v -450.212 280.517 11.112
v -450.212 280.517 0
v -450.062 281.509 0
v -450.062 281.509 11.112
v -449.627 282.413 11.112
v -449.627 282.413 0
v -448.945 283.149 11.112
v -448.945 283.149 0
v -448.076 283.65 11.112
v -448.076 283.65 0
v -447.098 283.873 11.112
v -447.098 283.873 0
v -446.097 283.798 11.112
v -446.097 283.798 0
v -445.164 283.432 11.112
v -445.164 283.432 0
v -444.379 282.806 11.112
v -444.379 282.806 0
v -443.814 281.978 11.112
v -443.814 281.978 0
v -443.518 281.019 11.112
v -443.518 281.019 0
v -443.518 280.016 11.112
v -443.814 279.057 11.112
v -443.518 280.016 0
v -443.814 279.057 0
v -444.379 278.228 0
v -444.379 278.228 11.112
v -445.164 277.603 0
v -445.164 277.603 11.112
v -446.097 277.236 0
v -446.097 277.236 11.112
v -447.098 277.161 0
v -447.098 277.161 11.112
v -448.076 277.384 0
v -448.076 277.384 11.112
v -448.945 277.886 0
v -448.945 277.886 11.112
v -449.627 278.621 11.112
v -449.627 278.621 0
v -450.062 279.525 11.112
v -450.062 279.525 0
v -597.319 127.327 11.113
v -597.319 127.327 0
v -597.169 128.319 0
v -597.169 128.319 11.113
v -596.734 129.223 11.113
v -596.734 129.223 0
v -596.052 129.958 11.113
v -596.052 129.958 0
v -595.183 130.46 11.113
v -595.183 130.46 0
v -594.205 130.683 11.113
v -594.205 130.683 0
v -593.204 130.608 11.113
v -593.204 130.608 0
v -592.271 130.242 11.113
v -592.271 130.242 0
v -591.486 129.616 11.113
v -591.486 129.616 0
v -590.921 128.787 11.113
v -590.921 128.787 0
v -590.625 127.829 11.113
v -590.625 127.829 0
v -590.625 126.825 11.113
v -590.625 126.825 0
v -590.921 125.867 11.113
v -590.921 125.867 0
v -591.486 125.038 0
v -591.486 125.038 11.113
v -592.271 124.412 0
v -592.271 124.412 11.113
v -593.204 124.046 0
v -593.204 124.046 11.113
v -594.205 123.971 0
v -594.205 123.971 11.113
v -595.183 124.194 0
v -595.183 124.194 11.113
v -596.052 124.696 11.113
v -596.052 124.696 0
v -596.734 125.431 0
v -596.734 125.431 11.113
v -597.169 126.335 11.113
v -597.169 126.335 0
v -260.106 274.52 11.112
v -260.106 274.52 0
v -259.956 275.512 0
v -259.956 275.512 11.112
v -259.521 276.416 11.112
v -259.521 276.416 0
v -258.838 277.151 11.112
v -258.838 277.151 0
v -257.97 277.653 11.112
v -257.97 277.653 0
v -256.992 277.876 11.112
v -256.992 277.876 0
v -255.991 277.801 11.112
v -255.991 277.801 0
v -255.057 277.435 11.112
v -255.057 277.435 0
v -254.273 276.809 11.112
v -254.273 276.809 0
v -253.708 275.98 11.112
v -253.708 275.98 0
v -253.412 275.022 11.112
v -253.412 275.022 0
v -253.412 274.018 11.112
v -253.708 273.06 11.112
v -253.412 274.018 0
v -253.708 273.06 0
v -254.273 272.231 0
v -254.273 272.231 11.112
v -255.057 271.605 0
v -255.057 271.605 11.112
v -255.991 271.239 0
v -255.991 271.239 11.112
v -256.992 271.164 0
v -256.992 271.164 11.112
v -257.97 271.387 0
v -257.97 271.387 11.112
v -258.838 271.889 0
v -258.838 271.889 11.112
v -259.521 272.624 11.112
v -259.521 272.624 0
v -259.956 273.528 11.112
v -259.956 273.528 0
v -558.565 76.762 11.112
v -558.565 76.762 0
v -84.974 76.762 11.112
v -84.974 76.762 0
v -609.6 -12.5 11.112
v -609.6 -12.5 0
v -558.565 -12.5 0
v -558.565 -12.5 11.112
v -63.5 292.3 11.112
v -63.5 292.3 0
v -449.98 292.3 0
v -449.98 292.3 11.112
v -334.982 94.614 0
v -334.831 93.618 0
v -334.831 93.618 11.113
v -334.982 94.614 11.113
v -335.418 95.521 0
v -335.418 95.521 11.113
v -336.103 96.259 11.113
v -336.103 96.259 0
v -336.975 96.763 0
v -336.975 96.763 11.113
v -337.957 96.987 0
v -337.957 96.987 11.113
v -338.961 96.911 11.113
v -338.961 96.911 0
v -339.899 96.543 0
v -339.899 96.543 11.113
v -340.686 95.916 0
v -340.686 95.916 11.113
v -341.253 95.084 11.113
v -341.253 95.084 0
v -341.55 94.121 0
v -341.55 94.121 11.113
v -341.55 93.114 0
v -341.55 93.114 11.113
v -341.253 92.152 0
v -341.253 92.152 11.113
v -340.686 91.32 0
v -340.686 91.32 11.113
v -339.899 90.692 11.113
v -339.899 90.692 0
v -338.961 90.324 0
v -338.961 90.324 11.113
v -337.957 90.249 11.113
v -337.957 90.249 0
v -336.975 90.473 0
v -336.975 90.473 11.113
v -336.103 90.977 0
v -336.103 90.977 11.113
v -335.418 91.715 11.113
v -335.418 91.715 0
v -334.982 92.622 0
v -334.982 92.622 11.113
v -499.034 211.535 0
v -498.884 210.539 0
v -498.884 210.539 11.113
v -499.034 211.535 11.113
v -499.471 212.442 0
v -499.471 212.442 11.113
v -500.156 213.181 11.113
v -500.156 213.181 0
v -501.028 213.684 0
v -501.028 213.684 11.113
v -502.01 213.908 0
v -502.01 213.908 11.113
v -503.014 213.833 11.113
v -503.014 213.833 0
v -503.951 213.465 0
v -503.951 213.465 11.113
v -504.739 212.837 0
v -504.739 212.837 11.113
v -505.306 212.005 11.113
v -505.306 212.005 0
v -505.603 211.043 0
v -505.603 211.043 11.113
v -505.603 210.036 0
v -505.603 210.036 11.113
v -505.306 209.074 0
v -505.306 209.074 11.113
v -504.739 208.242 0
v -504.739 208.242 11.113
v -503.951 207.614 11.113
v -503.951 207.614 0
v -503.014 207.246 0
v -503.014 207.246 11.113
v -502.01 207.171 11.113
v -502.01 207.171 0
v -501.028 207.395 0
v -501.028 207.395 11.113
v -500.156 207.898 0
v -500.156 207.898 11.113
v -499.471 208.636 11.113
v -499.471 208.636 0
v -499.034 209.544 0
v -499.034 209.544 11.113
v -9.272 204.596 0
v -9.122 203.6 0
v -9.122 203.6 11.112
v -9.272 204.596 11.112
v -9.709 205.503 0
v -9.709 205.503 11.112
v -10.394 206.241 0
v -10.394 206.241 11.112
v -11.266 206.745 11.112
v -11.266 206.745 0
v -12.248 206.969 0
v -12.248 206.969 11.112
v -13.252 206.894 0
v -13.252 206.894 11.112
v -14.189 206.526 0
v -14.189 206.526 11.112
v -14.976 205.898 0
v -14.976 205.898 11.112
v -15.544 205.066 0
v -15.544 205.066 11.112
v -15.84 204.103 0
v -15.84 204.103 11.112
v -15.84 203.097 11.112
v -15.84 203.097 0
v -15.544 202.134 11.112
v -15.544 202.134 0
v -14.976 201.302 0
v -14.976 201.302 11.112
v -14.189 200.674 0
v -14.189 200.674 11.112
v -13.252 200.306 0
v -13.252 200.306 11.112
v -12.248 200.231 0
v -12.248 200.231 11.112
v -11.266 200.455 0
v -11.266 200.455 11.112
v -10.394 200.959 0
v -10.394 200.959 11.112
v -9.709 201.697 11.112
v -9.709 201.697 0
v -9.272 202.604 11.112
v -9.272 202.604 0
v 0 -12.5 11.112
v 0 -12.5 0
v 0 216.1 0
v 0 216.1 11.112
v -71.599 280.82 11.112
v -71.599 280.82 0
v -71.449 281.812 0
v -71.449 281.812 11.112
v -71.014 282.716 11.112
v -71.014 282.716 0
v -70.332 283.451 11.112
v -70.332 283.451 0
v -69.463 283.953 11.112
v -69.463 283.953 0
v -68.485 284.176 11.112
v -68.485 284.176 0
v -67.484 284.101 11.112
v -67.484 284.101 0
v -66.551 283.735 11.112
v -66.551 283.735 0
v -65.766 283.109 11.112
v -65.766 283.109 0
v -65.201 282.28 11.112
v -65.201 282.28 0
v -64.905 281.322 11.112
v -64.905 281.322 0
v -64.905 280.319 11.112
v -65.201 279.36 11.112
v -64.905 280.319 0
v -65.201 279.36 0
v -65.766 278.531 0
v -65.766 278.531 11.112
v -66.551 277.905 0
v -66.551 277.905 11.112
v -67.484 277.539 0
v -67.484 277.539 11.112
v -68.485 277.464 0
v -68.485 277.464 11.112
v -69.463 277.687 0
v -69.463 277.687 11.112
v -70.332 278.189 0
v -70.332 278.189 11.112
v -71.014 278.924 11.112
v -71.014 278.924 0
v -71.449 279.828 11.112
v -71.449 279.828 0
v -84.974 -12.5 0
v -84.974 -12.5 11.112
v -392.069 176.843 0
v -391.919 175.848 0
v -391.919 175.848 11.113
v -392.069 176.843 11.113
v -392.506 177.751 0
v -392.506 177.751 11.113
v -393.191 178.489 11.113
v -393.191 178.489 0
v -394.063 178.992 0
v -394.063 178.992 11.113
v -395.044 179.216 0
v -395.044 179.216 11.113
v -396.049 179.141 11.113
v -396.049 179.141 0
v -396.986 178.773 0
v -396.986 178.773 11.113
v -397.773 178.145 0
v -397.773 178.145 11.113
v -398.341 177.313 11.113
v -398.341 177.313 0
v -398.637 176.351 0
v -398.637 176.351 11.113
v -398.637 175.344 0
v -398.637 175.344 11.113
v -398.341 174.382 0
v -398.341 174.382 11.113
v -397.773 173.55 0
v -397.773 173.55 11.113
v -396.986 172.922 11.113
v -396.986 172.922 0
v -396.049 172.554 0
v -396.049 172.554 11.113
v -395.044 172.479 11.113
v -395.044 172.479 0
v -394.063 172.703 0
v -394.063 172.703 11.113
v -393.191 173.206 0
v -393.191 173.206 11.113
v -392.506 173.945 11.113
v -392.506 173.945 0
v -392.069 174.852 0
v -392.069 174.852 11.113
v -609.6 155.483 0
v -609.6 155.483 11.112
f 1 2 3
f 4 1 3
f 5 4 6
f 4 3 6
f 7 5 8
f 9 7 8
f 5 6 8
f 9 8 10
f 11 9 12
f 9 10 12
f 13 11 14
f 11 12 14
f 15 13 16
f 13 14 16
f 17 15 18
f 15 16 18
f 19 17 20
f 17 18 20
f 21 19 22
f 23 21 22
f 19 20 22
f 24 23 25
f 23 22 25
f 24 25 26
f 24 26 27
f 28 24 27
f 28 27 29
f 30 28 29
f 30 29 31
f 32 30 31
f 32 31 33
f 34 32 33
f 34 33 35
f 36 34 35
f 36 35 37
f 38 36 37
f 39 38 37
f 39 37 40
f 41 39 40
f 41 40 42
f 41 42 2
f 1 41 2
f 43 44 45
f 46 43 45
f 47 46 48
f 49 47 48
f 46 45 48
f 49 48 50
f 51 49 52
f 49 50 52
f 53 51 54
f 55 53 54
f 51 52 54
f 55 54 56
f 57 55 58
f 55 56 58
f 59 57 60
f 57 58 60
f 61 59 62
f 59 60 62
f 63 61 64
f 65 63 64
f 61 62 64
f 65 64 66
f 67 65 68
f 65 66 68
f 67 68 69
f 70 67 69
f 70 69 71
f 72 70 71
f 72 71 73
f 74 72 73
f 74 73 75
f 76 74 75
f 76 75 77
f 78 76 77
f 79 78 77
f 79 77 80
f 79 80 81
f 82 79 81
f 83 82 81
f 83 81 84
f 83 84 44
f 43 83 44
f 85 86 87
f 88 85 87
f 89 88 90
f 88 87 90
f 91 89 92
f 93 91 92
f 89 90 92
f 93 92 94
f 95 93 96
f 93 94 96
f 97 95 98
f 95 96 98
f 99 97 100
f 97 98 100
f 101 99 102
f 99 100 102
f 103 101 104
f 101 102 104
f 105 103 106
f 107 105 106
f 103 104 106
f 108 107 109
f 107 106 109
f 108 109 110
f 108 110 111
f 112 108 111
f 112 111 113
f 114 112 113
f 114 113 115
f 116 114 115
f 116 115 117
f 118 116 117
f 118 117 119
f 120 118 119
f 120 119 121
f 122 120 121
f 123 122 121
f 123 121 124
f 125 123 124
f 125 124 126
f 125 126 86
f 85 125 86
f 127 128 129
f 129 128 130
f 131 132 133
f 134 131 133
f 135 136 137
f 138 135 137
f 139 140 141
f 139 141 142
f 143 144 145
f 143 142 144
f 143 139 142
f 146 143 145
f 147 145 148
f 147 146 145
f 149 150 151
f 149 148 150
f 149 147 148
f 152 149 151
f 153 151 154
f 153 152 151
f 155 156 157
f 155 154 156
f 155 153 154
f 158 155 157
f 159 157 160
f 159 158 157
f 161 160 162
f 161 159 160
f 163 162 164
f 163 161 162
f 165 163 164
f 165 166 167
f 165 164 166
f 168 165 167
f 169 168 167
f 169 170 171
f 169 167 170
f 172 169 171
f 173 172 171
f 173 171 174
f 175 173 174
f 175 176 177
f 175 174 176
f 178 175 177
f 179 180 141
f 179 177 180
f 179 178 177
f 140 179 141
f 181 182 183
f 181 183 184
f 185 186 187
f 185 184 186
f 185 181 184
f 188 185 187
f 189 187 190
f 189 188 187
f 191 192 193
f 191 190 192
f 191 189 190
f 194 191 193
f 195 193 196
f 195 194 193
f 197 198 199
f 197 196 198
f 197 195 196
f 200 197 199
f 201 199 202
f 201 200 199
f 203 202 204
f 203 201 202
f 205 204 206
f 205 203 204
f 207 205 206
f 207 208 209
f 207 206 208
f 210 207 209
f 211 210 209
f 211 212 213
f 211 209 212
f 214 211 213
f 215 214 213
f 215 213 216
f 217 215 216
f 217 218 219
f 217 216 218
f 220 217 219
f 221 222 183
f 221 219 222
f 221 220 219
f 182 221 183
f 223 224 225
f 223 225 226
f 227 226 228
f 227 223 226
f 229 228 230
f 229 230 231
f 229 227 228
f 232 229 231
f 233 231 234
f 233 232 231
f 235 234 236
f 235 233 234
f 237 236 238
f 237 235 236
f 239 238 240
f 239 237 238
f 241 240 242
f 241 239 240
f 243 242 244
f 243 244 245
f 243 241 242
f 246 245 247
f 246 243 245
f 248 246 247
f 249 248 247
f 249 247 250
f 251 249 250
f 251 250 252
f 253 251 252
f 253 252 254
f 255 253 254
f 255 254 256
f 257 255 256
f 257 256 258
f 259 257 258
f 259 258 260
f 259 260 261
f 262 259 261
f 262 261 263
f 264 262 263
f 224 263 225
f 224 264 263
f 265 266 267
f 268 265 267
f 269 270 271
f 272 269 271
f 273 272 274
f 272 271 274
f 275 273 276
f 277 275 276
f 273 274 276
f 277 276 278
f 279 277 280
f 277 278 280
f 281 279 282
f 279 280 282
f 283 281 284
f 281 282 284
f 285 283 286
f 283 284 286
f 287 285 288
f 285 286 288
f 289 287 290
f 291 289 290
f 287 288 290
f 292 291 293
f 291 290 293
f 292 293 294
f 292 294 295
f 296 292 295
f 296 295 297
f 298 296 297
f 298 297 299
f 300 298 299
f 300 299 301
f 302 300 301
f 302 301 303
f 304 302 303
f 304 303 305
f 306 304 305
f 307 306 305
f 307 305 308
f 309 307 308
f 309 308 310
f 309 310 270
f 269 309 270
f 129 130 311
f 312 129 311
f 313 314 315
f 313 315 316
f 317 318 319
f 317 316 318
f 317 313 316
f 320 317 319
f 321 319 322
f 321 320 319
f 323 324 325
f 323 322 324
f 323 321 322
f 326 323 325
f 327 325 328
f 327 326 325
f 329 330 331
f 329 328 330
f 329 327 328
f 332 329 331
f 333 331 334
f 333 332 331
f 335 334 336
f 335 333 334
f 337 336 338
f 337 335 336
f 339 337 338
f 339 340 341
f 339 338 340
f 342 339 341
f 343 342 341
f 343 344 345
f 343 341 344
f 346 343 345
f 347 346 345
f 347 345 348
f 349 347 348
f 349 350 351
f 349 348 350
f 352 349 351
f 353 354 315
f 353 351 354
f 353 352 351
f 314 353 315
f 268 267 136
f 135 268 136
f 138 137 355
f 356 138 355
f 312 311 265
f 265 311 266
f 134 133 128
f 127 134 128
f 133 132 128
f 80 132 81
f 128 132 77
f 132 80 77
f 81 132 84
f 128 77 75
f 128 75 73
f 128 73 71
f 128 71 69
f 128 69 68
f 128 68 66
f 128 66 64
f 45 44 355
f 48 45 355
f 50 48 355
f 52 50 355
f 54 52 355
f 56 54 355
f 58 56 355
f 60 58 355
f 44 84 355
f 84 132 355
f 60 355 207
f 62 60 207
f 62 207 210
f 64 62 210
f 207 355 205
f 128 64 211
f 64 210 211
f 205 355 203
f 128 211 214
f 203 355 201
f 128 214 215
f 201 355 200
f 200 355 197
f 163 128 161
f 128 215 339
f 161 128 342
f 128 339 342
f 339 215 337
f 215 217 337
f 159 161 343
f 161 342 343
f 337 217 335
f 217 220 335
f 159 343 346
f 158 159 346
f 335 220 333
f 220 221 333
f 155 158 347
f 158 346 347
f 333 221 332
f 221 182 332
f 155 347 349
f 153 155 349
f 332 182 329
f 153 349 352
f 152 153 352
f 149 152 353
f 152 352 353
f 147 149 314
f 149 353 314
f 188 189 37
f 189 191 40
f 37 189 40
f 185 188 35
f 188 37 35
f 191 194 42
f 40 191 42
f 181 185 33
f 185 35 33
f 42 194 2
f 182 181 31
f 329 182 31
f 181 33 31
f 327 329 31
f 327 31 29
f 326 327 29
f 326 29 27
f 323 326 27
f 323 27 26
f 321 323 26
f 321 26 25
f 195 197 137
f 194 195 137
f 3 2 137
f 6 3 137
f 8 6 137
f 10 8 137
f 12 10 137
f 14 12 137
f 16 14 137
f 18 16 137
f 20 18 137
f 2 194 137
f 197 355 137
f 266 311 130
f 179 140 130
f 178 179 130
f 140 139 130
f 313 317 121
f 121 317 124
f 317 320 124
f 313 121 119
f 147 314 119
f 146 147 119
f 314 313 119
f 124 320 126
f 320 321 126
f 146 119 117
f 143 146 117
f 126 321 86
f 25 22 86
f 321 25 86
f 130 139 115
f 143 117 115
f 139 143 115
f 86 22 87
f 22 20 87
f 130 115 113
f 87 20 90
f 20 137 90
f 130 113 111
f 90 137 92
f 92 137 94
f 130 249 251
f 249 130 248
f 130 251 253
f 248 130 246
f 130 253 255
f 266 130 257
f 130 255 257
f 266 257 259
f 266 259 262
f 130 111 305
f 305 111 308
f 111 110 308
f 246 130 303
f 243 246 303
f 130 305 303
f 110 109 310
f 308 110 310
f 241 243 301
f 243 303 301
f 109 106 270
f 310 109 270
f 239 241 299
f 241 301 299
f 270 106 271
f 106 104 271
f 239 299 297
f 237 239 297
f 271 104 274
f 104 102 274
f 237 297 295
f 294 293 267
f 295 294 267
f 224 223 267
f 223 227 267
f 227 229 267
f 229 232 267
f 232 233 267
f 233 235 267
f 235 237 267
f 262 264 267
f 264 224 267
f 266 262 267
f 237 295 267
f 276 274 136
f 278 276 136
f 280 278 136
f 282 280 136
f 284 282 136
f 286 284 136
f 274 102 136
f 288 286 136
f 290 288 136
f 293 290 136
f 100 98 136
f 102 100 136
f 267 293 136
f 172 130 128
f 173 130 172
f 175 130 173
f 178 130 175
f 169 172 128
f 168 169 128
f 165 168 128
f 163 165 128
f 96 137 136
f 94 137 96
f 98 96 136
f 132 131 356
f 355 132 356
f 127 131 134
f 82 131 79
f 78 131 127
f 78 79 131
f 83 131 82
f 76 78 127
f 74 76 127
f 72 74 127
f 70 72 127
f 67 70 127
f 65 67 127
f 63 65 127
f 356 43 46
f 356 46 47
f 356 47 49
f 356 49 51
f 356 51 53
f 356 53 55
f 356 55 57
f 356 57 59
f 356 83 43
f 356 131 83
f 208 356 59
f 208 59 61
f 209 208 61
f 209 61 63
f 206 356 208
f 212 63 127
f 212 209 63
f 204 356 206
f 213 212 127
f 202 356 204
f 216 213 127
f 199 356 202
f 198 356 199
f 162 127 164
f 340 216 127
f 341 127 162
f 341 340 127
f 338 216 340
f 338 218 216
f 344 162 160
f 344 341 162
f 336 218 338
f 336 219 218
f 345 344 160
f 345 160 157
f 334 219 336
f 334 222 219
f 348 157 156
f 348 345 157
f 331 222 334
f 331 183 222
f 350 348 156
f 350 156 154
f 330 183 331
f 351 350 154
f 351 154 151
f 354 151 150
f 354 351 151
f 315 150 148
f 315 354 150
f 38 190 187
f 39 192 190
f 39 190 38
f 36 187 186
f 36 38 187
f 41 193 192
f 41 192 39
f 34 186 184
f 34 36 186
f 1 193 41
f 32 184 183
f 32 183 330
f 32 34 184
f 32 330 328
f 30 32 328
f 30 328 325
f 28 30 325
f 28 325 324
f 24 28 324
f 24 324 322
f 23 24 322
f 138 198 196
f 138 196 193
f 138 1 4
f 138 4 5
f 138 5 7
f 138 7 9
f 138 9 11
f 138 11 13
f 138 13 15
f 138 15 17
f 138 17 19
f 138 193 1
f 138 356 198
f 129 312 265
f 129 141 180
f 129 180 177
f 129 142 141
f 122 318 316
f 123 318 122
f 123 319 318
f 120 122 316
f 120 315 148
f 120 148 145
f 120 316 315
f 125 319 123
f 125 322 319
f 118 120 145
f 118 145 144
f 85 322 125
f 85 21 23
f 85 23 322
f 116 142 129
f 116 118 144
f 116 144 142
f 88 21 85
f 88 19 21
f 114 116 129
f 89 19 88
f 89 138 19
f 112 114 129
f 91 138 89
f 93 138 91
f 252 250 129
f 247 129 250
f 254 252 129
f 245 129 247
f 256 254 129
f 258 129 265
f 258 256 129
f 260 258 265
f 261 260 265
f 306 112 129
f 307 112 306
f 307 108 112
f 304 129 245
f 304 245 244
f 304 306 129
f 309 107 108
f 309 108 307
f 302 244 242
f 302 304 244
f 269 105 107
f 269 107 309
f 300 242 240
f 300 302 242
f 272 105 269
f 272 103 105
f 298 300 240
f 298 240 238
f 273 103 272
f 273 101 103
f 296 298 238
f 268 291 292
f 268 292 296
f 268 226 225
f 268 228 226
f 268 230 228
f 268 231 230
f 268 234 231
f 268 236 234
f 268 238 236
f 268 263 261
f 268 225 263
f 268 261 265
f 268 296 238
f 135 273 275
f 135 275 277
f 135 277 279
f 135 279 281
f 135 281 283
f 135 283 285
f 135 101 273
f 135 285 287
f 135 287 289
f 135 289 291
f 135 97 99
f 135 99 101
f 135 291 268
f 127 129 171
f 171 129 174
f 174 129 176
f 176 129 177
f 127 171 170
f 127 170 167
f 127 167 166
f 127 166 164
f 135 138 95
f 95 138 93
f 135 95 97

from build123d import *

# Parameters (mm, degrees)
SKETCH1_R               = 3.3782
BOSS_EXTRUDE1_DEPTH     = 11.1125
SKETCH2_R               = 3.3655
CUT_EXTRUDE1_DEPTH      = 421.288113218
SKETCH3_R               = 3.3655
CUT_EXTRUDE2_DEPTH      = 421.177767573
SKETCH4_R               = 3.3655
CUT_EXTRUDE3_DEPTH      = 421.177767573
SKETCH5_R               = 3.3655
CUT_EXTRUDE4_DEPTH      = 421.177767573
CUT_EXTRUDE5_DEPTH      = 421.393634125
CUT_EXTRUDE5_DEPTH_BACK = 421.393634125
SKETCH6_R               = 3.3782
SKETCH7_W               = 18.18
SKETCH7_H               = 167.982857143
CUT_EXTRUDE6_DEPTH      = 693.582490434


with BuildPart() as part:
    # Sketch1 → Boss-Extrude1 (new body)
    with BuildSketch(Plane.XY):
        Polygon((-558.565, 76.762), (-458.235, 76.762), (-140.853700004, 76.762), (-84.973700004, 76.762), (-84.973700004, -12.5), (0, -12.5), (0, 216.1), (-63.5, 292.3), (-449.98, 292.3), (-627.78, 139.9), (-627.78, -12.5), (-558.565, -12.5), align=None)
        with Locations((-12.5, 203.6)):
            Circle(SKETCH1_R, mode=Mode.SUBTRACT)
    extrude(amount=BOSS_EXTRUDE1_DEPTH)

    # Sketch2 → Cut-Extrude1 (cut, through all)
    with BuildSketch(Plane(origin=(-305, 23.6125, -5.08), x_dir=(-1, 0, 0), z_dir=(0, 0, -1))):
        with Locations((288.9533823, 103.7145)):
            Circle(SKETCH2_R)
    extrude(amount=-CUT_EXTRUDE1_DEPTH, mode=Mode.SUBTRACT)

    # Sketch3 → Cut-Extrude2 (cut, through all)
    with BuildSketch(Plane(origin=(-305, 23.6125, -1.905), x_dir=(-1, 0, 0), z_dir=(0, 0, -1))):
        with Locations((141.846254523, 256.904809604)):
            Circle(SKETCH3_R)
    extrude(amount=-CUT_EXTRUDE2_DEPTH, mode=Mode.SUBTRACT)

    # Sketch4 → Cut-Extrude3 (cut, through all)
    with BuildSketch(Plane(origin=(-305, 23.6125, -1.905), x_dir=(-1, 0, 0), z_dir=(0, 0, -1))):
        with Locations((-48.26, 250.9075)):
            Circle(SKETCH4_R)
    extrude(amount=-CUT_EXTRUDE3_DEPTH, mode=Mode.SUBTRACT)

    # Sketch5 → Cut-Extrude4 (cut, through all)
    with BuildSketch(Plane(origin=(-305, 23.6125, -1.905), x_dir=(-1, 0, 0), z_dir=(0, 0, -1))):
        with Locations((-236.766660116, 257.207608298)):
            Circle(SKETCH5_R)
    extrude(amount=-CUT_EXTRUDE4_DEPTH, mode=Mode.SUBTRACT)

    # Sketch6 → Cut-Extrude5 (cut, two sides: drawn at the far end of the back side and taken through both)
    with BuildSketch(Plane(origin=(-305, 23.6125, 18.7325), x_dir=(1, 0, 0), z_dir=(0, 0, 1)).offset(-CUT_EXTRUDE5_DEPTH_BACK)):
        with Locations((-197.262125611, 186.926969688)):
            Circle(SKETCH6_R)
        with Locations((-33.209654284, 70.005387803)):
            Circle(SKETCH6_R)
        with Locations((-90.296950895, 152.235012548)):
            Circle(SKETCH6_R)
    extrude(amount=CUT_EXTRUDE5_DEPTH + CUT_EXTRUDE5_DEPTH_BACK, mode=Mode.SUBTRACT)

    # Sketch7 → Cut-Extrude6 (cut, through all)
    with BuildSketch(Plane.XY.offset(11.1125)):
        with Locations((-618.69, 71.491428572)):
            Rectangle(SKETCH7_W, SKETCH7_H)
    extrude(amount=-CUT_EXTRUDE6_DEPTH, mode=Mode.SUBTRACT)


solid = part.part
